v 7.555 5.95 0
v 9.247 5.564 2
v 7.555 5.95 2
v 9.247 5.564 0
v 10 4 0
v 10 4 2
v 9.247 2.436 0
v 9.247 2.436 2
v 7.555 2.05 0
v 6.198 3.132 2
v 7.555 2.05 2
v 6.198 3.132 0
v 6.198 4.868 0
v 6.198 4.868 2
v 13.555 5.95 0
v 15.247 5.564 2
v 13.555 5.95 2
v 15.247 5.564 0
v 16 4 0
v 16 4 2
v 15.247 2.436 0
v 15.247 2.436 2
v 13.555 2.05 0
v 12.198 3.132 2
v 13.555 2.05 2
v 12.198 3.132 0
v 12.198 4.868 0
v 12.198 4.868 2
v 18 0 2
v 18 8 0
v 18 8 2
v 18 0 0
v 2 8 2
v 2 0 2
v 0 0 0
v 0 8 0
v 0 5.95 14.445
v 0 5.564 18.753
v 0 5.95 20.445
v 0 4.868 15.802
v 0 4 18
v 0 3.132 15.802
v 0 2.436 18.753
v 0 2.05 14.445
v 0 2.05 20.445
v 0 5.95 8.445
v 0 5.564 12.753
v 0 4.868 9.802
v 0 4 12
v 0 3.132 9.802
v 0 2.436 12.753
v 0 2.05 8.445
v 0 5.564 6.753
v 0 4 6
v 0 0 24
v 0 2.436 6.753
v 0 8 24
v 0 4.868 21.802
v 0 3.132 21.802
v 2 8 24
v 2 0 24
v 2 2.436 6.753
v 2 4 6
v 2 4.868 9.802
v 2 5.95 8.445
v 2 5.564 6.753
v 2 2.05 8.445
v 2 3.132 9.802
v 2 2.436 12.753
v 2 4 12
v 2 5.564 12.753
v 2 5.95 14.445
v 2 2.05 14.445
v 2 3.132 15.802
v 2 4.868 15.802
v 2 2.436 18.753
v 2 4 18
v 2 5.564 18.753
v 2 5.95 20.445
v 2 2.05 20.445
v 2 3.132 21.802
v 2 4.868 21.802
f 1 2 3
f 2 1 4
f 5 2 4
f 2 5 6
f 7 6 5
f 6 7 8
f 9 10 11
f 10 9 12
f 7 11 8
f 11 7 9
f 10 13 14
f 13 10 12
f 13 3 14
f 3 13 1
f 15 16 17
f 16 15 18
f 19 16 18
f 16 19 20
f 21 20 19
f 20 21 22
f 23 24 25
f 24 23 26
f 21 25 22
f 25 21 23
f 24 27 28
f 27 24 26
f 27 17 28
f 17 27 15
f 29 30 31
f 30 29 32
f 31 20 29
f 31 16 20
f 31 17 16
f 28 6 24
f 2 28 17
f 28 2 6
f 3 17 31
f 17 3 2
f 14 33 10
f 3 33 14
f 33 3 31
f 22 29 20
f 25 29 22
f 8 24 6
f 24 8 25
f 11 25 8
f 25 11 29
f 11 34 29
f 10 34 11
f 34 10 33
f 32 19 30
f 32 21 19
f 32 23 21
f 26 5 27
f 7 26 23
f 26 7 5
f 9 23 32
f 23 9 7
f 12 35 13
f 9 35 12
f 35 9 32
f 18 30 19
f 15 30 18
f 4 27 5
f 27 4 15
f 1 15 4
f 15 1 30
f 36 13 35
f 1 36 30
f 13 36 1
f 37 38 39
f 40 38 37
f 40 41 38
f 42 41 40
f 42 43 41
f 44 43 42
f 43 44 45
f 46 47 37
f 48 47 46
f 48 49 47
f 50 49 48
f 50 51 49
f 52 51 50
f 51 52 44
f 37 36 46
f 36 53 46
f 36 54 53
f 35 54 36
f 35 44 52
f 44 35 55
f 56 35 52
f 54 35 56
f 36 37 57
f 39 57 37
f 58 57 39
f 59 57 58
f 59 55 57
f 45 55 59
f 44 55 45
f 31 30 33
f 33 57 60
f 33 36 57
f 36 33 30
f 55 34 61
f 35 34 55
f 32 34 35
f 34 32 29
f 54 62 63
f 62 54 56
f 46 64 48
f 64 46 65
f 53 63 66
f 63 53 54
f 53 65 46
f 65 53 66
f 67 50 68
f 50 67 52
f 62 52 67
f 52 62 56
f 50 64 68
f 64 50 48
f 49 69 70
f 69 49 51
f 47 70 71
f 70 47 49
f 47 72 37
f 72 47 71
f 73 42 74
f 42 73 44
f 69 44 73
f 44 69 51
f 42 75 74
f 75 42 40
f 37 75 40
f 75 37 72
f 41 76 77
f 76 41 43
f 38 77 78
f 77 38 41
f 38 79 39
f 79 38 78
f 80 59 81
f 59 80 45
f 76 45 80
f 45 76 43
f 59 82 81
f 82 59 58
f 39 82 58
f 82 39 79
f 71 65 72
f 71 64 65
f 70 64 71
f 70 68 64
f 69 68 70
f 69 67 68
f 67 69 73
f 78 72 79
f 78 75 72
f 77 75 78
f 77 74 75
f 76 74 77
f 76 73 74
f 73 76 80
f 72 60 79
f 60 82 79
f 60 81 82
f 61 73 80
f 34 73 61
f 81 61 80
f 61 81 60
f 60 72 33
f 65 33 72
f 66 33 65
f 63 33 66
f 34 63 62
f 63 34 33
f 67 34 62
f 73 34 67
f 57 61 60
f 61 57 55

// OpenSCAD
// configuration
width = 2;      // in holes
height = 3;    // in holes
thickness = 2;  // in mm
hole = 4;       // diameter in mm
pad = 2;        // in mm

// internal data
h = (hole + pad) * (width + 1);
v = (hole + pad) * (height + 1);
w = 2 * pad + hole;

difference() {
    cube([h, w, thickness]);
    for(i=[1,width]) {
        translate([(hole + pad) * i + hole / 2, pad + hole/2, -thickness]) {
            cylinder(h = thickness * 3, r = hole / 2);
        };
    };
};
difference() {
    cube([thickness, w, v]);
    for(i=[1:height]) {
        translate([-thickness, pad + hole/2, (hole + pad) * i + hole / 2]) {
            rotate([0, 90, 0]) {
                cylinder(h = thickness * 3, r = hole / 2);
            };
        };
    };
}
